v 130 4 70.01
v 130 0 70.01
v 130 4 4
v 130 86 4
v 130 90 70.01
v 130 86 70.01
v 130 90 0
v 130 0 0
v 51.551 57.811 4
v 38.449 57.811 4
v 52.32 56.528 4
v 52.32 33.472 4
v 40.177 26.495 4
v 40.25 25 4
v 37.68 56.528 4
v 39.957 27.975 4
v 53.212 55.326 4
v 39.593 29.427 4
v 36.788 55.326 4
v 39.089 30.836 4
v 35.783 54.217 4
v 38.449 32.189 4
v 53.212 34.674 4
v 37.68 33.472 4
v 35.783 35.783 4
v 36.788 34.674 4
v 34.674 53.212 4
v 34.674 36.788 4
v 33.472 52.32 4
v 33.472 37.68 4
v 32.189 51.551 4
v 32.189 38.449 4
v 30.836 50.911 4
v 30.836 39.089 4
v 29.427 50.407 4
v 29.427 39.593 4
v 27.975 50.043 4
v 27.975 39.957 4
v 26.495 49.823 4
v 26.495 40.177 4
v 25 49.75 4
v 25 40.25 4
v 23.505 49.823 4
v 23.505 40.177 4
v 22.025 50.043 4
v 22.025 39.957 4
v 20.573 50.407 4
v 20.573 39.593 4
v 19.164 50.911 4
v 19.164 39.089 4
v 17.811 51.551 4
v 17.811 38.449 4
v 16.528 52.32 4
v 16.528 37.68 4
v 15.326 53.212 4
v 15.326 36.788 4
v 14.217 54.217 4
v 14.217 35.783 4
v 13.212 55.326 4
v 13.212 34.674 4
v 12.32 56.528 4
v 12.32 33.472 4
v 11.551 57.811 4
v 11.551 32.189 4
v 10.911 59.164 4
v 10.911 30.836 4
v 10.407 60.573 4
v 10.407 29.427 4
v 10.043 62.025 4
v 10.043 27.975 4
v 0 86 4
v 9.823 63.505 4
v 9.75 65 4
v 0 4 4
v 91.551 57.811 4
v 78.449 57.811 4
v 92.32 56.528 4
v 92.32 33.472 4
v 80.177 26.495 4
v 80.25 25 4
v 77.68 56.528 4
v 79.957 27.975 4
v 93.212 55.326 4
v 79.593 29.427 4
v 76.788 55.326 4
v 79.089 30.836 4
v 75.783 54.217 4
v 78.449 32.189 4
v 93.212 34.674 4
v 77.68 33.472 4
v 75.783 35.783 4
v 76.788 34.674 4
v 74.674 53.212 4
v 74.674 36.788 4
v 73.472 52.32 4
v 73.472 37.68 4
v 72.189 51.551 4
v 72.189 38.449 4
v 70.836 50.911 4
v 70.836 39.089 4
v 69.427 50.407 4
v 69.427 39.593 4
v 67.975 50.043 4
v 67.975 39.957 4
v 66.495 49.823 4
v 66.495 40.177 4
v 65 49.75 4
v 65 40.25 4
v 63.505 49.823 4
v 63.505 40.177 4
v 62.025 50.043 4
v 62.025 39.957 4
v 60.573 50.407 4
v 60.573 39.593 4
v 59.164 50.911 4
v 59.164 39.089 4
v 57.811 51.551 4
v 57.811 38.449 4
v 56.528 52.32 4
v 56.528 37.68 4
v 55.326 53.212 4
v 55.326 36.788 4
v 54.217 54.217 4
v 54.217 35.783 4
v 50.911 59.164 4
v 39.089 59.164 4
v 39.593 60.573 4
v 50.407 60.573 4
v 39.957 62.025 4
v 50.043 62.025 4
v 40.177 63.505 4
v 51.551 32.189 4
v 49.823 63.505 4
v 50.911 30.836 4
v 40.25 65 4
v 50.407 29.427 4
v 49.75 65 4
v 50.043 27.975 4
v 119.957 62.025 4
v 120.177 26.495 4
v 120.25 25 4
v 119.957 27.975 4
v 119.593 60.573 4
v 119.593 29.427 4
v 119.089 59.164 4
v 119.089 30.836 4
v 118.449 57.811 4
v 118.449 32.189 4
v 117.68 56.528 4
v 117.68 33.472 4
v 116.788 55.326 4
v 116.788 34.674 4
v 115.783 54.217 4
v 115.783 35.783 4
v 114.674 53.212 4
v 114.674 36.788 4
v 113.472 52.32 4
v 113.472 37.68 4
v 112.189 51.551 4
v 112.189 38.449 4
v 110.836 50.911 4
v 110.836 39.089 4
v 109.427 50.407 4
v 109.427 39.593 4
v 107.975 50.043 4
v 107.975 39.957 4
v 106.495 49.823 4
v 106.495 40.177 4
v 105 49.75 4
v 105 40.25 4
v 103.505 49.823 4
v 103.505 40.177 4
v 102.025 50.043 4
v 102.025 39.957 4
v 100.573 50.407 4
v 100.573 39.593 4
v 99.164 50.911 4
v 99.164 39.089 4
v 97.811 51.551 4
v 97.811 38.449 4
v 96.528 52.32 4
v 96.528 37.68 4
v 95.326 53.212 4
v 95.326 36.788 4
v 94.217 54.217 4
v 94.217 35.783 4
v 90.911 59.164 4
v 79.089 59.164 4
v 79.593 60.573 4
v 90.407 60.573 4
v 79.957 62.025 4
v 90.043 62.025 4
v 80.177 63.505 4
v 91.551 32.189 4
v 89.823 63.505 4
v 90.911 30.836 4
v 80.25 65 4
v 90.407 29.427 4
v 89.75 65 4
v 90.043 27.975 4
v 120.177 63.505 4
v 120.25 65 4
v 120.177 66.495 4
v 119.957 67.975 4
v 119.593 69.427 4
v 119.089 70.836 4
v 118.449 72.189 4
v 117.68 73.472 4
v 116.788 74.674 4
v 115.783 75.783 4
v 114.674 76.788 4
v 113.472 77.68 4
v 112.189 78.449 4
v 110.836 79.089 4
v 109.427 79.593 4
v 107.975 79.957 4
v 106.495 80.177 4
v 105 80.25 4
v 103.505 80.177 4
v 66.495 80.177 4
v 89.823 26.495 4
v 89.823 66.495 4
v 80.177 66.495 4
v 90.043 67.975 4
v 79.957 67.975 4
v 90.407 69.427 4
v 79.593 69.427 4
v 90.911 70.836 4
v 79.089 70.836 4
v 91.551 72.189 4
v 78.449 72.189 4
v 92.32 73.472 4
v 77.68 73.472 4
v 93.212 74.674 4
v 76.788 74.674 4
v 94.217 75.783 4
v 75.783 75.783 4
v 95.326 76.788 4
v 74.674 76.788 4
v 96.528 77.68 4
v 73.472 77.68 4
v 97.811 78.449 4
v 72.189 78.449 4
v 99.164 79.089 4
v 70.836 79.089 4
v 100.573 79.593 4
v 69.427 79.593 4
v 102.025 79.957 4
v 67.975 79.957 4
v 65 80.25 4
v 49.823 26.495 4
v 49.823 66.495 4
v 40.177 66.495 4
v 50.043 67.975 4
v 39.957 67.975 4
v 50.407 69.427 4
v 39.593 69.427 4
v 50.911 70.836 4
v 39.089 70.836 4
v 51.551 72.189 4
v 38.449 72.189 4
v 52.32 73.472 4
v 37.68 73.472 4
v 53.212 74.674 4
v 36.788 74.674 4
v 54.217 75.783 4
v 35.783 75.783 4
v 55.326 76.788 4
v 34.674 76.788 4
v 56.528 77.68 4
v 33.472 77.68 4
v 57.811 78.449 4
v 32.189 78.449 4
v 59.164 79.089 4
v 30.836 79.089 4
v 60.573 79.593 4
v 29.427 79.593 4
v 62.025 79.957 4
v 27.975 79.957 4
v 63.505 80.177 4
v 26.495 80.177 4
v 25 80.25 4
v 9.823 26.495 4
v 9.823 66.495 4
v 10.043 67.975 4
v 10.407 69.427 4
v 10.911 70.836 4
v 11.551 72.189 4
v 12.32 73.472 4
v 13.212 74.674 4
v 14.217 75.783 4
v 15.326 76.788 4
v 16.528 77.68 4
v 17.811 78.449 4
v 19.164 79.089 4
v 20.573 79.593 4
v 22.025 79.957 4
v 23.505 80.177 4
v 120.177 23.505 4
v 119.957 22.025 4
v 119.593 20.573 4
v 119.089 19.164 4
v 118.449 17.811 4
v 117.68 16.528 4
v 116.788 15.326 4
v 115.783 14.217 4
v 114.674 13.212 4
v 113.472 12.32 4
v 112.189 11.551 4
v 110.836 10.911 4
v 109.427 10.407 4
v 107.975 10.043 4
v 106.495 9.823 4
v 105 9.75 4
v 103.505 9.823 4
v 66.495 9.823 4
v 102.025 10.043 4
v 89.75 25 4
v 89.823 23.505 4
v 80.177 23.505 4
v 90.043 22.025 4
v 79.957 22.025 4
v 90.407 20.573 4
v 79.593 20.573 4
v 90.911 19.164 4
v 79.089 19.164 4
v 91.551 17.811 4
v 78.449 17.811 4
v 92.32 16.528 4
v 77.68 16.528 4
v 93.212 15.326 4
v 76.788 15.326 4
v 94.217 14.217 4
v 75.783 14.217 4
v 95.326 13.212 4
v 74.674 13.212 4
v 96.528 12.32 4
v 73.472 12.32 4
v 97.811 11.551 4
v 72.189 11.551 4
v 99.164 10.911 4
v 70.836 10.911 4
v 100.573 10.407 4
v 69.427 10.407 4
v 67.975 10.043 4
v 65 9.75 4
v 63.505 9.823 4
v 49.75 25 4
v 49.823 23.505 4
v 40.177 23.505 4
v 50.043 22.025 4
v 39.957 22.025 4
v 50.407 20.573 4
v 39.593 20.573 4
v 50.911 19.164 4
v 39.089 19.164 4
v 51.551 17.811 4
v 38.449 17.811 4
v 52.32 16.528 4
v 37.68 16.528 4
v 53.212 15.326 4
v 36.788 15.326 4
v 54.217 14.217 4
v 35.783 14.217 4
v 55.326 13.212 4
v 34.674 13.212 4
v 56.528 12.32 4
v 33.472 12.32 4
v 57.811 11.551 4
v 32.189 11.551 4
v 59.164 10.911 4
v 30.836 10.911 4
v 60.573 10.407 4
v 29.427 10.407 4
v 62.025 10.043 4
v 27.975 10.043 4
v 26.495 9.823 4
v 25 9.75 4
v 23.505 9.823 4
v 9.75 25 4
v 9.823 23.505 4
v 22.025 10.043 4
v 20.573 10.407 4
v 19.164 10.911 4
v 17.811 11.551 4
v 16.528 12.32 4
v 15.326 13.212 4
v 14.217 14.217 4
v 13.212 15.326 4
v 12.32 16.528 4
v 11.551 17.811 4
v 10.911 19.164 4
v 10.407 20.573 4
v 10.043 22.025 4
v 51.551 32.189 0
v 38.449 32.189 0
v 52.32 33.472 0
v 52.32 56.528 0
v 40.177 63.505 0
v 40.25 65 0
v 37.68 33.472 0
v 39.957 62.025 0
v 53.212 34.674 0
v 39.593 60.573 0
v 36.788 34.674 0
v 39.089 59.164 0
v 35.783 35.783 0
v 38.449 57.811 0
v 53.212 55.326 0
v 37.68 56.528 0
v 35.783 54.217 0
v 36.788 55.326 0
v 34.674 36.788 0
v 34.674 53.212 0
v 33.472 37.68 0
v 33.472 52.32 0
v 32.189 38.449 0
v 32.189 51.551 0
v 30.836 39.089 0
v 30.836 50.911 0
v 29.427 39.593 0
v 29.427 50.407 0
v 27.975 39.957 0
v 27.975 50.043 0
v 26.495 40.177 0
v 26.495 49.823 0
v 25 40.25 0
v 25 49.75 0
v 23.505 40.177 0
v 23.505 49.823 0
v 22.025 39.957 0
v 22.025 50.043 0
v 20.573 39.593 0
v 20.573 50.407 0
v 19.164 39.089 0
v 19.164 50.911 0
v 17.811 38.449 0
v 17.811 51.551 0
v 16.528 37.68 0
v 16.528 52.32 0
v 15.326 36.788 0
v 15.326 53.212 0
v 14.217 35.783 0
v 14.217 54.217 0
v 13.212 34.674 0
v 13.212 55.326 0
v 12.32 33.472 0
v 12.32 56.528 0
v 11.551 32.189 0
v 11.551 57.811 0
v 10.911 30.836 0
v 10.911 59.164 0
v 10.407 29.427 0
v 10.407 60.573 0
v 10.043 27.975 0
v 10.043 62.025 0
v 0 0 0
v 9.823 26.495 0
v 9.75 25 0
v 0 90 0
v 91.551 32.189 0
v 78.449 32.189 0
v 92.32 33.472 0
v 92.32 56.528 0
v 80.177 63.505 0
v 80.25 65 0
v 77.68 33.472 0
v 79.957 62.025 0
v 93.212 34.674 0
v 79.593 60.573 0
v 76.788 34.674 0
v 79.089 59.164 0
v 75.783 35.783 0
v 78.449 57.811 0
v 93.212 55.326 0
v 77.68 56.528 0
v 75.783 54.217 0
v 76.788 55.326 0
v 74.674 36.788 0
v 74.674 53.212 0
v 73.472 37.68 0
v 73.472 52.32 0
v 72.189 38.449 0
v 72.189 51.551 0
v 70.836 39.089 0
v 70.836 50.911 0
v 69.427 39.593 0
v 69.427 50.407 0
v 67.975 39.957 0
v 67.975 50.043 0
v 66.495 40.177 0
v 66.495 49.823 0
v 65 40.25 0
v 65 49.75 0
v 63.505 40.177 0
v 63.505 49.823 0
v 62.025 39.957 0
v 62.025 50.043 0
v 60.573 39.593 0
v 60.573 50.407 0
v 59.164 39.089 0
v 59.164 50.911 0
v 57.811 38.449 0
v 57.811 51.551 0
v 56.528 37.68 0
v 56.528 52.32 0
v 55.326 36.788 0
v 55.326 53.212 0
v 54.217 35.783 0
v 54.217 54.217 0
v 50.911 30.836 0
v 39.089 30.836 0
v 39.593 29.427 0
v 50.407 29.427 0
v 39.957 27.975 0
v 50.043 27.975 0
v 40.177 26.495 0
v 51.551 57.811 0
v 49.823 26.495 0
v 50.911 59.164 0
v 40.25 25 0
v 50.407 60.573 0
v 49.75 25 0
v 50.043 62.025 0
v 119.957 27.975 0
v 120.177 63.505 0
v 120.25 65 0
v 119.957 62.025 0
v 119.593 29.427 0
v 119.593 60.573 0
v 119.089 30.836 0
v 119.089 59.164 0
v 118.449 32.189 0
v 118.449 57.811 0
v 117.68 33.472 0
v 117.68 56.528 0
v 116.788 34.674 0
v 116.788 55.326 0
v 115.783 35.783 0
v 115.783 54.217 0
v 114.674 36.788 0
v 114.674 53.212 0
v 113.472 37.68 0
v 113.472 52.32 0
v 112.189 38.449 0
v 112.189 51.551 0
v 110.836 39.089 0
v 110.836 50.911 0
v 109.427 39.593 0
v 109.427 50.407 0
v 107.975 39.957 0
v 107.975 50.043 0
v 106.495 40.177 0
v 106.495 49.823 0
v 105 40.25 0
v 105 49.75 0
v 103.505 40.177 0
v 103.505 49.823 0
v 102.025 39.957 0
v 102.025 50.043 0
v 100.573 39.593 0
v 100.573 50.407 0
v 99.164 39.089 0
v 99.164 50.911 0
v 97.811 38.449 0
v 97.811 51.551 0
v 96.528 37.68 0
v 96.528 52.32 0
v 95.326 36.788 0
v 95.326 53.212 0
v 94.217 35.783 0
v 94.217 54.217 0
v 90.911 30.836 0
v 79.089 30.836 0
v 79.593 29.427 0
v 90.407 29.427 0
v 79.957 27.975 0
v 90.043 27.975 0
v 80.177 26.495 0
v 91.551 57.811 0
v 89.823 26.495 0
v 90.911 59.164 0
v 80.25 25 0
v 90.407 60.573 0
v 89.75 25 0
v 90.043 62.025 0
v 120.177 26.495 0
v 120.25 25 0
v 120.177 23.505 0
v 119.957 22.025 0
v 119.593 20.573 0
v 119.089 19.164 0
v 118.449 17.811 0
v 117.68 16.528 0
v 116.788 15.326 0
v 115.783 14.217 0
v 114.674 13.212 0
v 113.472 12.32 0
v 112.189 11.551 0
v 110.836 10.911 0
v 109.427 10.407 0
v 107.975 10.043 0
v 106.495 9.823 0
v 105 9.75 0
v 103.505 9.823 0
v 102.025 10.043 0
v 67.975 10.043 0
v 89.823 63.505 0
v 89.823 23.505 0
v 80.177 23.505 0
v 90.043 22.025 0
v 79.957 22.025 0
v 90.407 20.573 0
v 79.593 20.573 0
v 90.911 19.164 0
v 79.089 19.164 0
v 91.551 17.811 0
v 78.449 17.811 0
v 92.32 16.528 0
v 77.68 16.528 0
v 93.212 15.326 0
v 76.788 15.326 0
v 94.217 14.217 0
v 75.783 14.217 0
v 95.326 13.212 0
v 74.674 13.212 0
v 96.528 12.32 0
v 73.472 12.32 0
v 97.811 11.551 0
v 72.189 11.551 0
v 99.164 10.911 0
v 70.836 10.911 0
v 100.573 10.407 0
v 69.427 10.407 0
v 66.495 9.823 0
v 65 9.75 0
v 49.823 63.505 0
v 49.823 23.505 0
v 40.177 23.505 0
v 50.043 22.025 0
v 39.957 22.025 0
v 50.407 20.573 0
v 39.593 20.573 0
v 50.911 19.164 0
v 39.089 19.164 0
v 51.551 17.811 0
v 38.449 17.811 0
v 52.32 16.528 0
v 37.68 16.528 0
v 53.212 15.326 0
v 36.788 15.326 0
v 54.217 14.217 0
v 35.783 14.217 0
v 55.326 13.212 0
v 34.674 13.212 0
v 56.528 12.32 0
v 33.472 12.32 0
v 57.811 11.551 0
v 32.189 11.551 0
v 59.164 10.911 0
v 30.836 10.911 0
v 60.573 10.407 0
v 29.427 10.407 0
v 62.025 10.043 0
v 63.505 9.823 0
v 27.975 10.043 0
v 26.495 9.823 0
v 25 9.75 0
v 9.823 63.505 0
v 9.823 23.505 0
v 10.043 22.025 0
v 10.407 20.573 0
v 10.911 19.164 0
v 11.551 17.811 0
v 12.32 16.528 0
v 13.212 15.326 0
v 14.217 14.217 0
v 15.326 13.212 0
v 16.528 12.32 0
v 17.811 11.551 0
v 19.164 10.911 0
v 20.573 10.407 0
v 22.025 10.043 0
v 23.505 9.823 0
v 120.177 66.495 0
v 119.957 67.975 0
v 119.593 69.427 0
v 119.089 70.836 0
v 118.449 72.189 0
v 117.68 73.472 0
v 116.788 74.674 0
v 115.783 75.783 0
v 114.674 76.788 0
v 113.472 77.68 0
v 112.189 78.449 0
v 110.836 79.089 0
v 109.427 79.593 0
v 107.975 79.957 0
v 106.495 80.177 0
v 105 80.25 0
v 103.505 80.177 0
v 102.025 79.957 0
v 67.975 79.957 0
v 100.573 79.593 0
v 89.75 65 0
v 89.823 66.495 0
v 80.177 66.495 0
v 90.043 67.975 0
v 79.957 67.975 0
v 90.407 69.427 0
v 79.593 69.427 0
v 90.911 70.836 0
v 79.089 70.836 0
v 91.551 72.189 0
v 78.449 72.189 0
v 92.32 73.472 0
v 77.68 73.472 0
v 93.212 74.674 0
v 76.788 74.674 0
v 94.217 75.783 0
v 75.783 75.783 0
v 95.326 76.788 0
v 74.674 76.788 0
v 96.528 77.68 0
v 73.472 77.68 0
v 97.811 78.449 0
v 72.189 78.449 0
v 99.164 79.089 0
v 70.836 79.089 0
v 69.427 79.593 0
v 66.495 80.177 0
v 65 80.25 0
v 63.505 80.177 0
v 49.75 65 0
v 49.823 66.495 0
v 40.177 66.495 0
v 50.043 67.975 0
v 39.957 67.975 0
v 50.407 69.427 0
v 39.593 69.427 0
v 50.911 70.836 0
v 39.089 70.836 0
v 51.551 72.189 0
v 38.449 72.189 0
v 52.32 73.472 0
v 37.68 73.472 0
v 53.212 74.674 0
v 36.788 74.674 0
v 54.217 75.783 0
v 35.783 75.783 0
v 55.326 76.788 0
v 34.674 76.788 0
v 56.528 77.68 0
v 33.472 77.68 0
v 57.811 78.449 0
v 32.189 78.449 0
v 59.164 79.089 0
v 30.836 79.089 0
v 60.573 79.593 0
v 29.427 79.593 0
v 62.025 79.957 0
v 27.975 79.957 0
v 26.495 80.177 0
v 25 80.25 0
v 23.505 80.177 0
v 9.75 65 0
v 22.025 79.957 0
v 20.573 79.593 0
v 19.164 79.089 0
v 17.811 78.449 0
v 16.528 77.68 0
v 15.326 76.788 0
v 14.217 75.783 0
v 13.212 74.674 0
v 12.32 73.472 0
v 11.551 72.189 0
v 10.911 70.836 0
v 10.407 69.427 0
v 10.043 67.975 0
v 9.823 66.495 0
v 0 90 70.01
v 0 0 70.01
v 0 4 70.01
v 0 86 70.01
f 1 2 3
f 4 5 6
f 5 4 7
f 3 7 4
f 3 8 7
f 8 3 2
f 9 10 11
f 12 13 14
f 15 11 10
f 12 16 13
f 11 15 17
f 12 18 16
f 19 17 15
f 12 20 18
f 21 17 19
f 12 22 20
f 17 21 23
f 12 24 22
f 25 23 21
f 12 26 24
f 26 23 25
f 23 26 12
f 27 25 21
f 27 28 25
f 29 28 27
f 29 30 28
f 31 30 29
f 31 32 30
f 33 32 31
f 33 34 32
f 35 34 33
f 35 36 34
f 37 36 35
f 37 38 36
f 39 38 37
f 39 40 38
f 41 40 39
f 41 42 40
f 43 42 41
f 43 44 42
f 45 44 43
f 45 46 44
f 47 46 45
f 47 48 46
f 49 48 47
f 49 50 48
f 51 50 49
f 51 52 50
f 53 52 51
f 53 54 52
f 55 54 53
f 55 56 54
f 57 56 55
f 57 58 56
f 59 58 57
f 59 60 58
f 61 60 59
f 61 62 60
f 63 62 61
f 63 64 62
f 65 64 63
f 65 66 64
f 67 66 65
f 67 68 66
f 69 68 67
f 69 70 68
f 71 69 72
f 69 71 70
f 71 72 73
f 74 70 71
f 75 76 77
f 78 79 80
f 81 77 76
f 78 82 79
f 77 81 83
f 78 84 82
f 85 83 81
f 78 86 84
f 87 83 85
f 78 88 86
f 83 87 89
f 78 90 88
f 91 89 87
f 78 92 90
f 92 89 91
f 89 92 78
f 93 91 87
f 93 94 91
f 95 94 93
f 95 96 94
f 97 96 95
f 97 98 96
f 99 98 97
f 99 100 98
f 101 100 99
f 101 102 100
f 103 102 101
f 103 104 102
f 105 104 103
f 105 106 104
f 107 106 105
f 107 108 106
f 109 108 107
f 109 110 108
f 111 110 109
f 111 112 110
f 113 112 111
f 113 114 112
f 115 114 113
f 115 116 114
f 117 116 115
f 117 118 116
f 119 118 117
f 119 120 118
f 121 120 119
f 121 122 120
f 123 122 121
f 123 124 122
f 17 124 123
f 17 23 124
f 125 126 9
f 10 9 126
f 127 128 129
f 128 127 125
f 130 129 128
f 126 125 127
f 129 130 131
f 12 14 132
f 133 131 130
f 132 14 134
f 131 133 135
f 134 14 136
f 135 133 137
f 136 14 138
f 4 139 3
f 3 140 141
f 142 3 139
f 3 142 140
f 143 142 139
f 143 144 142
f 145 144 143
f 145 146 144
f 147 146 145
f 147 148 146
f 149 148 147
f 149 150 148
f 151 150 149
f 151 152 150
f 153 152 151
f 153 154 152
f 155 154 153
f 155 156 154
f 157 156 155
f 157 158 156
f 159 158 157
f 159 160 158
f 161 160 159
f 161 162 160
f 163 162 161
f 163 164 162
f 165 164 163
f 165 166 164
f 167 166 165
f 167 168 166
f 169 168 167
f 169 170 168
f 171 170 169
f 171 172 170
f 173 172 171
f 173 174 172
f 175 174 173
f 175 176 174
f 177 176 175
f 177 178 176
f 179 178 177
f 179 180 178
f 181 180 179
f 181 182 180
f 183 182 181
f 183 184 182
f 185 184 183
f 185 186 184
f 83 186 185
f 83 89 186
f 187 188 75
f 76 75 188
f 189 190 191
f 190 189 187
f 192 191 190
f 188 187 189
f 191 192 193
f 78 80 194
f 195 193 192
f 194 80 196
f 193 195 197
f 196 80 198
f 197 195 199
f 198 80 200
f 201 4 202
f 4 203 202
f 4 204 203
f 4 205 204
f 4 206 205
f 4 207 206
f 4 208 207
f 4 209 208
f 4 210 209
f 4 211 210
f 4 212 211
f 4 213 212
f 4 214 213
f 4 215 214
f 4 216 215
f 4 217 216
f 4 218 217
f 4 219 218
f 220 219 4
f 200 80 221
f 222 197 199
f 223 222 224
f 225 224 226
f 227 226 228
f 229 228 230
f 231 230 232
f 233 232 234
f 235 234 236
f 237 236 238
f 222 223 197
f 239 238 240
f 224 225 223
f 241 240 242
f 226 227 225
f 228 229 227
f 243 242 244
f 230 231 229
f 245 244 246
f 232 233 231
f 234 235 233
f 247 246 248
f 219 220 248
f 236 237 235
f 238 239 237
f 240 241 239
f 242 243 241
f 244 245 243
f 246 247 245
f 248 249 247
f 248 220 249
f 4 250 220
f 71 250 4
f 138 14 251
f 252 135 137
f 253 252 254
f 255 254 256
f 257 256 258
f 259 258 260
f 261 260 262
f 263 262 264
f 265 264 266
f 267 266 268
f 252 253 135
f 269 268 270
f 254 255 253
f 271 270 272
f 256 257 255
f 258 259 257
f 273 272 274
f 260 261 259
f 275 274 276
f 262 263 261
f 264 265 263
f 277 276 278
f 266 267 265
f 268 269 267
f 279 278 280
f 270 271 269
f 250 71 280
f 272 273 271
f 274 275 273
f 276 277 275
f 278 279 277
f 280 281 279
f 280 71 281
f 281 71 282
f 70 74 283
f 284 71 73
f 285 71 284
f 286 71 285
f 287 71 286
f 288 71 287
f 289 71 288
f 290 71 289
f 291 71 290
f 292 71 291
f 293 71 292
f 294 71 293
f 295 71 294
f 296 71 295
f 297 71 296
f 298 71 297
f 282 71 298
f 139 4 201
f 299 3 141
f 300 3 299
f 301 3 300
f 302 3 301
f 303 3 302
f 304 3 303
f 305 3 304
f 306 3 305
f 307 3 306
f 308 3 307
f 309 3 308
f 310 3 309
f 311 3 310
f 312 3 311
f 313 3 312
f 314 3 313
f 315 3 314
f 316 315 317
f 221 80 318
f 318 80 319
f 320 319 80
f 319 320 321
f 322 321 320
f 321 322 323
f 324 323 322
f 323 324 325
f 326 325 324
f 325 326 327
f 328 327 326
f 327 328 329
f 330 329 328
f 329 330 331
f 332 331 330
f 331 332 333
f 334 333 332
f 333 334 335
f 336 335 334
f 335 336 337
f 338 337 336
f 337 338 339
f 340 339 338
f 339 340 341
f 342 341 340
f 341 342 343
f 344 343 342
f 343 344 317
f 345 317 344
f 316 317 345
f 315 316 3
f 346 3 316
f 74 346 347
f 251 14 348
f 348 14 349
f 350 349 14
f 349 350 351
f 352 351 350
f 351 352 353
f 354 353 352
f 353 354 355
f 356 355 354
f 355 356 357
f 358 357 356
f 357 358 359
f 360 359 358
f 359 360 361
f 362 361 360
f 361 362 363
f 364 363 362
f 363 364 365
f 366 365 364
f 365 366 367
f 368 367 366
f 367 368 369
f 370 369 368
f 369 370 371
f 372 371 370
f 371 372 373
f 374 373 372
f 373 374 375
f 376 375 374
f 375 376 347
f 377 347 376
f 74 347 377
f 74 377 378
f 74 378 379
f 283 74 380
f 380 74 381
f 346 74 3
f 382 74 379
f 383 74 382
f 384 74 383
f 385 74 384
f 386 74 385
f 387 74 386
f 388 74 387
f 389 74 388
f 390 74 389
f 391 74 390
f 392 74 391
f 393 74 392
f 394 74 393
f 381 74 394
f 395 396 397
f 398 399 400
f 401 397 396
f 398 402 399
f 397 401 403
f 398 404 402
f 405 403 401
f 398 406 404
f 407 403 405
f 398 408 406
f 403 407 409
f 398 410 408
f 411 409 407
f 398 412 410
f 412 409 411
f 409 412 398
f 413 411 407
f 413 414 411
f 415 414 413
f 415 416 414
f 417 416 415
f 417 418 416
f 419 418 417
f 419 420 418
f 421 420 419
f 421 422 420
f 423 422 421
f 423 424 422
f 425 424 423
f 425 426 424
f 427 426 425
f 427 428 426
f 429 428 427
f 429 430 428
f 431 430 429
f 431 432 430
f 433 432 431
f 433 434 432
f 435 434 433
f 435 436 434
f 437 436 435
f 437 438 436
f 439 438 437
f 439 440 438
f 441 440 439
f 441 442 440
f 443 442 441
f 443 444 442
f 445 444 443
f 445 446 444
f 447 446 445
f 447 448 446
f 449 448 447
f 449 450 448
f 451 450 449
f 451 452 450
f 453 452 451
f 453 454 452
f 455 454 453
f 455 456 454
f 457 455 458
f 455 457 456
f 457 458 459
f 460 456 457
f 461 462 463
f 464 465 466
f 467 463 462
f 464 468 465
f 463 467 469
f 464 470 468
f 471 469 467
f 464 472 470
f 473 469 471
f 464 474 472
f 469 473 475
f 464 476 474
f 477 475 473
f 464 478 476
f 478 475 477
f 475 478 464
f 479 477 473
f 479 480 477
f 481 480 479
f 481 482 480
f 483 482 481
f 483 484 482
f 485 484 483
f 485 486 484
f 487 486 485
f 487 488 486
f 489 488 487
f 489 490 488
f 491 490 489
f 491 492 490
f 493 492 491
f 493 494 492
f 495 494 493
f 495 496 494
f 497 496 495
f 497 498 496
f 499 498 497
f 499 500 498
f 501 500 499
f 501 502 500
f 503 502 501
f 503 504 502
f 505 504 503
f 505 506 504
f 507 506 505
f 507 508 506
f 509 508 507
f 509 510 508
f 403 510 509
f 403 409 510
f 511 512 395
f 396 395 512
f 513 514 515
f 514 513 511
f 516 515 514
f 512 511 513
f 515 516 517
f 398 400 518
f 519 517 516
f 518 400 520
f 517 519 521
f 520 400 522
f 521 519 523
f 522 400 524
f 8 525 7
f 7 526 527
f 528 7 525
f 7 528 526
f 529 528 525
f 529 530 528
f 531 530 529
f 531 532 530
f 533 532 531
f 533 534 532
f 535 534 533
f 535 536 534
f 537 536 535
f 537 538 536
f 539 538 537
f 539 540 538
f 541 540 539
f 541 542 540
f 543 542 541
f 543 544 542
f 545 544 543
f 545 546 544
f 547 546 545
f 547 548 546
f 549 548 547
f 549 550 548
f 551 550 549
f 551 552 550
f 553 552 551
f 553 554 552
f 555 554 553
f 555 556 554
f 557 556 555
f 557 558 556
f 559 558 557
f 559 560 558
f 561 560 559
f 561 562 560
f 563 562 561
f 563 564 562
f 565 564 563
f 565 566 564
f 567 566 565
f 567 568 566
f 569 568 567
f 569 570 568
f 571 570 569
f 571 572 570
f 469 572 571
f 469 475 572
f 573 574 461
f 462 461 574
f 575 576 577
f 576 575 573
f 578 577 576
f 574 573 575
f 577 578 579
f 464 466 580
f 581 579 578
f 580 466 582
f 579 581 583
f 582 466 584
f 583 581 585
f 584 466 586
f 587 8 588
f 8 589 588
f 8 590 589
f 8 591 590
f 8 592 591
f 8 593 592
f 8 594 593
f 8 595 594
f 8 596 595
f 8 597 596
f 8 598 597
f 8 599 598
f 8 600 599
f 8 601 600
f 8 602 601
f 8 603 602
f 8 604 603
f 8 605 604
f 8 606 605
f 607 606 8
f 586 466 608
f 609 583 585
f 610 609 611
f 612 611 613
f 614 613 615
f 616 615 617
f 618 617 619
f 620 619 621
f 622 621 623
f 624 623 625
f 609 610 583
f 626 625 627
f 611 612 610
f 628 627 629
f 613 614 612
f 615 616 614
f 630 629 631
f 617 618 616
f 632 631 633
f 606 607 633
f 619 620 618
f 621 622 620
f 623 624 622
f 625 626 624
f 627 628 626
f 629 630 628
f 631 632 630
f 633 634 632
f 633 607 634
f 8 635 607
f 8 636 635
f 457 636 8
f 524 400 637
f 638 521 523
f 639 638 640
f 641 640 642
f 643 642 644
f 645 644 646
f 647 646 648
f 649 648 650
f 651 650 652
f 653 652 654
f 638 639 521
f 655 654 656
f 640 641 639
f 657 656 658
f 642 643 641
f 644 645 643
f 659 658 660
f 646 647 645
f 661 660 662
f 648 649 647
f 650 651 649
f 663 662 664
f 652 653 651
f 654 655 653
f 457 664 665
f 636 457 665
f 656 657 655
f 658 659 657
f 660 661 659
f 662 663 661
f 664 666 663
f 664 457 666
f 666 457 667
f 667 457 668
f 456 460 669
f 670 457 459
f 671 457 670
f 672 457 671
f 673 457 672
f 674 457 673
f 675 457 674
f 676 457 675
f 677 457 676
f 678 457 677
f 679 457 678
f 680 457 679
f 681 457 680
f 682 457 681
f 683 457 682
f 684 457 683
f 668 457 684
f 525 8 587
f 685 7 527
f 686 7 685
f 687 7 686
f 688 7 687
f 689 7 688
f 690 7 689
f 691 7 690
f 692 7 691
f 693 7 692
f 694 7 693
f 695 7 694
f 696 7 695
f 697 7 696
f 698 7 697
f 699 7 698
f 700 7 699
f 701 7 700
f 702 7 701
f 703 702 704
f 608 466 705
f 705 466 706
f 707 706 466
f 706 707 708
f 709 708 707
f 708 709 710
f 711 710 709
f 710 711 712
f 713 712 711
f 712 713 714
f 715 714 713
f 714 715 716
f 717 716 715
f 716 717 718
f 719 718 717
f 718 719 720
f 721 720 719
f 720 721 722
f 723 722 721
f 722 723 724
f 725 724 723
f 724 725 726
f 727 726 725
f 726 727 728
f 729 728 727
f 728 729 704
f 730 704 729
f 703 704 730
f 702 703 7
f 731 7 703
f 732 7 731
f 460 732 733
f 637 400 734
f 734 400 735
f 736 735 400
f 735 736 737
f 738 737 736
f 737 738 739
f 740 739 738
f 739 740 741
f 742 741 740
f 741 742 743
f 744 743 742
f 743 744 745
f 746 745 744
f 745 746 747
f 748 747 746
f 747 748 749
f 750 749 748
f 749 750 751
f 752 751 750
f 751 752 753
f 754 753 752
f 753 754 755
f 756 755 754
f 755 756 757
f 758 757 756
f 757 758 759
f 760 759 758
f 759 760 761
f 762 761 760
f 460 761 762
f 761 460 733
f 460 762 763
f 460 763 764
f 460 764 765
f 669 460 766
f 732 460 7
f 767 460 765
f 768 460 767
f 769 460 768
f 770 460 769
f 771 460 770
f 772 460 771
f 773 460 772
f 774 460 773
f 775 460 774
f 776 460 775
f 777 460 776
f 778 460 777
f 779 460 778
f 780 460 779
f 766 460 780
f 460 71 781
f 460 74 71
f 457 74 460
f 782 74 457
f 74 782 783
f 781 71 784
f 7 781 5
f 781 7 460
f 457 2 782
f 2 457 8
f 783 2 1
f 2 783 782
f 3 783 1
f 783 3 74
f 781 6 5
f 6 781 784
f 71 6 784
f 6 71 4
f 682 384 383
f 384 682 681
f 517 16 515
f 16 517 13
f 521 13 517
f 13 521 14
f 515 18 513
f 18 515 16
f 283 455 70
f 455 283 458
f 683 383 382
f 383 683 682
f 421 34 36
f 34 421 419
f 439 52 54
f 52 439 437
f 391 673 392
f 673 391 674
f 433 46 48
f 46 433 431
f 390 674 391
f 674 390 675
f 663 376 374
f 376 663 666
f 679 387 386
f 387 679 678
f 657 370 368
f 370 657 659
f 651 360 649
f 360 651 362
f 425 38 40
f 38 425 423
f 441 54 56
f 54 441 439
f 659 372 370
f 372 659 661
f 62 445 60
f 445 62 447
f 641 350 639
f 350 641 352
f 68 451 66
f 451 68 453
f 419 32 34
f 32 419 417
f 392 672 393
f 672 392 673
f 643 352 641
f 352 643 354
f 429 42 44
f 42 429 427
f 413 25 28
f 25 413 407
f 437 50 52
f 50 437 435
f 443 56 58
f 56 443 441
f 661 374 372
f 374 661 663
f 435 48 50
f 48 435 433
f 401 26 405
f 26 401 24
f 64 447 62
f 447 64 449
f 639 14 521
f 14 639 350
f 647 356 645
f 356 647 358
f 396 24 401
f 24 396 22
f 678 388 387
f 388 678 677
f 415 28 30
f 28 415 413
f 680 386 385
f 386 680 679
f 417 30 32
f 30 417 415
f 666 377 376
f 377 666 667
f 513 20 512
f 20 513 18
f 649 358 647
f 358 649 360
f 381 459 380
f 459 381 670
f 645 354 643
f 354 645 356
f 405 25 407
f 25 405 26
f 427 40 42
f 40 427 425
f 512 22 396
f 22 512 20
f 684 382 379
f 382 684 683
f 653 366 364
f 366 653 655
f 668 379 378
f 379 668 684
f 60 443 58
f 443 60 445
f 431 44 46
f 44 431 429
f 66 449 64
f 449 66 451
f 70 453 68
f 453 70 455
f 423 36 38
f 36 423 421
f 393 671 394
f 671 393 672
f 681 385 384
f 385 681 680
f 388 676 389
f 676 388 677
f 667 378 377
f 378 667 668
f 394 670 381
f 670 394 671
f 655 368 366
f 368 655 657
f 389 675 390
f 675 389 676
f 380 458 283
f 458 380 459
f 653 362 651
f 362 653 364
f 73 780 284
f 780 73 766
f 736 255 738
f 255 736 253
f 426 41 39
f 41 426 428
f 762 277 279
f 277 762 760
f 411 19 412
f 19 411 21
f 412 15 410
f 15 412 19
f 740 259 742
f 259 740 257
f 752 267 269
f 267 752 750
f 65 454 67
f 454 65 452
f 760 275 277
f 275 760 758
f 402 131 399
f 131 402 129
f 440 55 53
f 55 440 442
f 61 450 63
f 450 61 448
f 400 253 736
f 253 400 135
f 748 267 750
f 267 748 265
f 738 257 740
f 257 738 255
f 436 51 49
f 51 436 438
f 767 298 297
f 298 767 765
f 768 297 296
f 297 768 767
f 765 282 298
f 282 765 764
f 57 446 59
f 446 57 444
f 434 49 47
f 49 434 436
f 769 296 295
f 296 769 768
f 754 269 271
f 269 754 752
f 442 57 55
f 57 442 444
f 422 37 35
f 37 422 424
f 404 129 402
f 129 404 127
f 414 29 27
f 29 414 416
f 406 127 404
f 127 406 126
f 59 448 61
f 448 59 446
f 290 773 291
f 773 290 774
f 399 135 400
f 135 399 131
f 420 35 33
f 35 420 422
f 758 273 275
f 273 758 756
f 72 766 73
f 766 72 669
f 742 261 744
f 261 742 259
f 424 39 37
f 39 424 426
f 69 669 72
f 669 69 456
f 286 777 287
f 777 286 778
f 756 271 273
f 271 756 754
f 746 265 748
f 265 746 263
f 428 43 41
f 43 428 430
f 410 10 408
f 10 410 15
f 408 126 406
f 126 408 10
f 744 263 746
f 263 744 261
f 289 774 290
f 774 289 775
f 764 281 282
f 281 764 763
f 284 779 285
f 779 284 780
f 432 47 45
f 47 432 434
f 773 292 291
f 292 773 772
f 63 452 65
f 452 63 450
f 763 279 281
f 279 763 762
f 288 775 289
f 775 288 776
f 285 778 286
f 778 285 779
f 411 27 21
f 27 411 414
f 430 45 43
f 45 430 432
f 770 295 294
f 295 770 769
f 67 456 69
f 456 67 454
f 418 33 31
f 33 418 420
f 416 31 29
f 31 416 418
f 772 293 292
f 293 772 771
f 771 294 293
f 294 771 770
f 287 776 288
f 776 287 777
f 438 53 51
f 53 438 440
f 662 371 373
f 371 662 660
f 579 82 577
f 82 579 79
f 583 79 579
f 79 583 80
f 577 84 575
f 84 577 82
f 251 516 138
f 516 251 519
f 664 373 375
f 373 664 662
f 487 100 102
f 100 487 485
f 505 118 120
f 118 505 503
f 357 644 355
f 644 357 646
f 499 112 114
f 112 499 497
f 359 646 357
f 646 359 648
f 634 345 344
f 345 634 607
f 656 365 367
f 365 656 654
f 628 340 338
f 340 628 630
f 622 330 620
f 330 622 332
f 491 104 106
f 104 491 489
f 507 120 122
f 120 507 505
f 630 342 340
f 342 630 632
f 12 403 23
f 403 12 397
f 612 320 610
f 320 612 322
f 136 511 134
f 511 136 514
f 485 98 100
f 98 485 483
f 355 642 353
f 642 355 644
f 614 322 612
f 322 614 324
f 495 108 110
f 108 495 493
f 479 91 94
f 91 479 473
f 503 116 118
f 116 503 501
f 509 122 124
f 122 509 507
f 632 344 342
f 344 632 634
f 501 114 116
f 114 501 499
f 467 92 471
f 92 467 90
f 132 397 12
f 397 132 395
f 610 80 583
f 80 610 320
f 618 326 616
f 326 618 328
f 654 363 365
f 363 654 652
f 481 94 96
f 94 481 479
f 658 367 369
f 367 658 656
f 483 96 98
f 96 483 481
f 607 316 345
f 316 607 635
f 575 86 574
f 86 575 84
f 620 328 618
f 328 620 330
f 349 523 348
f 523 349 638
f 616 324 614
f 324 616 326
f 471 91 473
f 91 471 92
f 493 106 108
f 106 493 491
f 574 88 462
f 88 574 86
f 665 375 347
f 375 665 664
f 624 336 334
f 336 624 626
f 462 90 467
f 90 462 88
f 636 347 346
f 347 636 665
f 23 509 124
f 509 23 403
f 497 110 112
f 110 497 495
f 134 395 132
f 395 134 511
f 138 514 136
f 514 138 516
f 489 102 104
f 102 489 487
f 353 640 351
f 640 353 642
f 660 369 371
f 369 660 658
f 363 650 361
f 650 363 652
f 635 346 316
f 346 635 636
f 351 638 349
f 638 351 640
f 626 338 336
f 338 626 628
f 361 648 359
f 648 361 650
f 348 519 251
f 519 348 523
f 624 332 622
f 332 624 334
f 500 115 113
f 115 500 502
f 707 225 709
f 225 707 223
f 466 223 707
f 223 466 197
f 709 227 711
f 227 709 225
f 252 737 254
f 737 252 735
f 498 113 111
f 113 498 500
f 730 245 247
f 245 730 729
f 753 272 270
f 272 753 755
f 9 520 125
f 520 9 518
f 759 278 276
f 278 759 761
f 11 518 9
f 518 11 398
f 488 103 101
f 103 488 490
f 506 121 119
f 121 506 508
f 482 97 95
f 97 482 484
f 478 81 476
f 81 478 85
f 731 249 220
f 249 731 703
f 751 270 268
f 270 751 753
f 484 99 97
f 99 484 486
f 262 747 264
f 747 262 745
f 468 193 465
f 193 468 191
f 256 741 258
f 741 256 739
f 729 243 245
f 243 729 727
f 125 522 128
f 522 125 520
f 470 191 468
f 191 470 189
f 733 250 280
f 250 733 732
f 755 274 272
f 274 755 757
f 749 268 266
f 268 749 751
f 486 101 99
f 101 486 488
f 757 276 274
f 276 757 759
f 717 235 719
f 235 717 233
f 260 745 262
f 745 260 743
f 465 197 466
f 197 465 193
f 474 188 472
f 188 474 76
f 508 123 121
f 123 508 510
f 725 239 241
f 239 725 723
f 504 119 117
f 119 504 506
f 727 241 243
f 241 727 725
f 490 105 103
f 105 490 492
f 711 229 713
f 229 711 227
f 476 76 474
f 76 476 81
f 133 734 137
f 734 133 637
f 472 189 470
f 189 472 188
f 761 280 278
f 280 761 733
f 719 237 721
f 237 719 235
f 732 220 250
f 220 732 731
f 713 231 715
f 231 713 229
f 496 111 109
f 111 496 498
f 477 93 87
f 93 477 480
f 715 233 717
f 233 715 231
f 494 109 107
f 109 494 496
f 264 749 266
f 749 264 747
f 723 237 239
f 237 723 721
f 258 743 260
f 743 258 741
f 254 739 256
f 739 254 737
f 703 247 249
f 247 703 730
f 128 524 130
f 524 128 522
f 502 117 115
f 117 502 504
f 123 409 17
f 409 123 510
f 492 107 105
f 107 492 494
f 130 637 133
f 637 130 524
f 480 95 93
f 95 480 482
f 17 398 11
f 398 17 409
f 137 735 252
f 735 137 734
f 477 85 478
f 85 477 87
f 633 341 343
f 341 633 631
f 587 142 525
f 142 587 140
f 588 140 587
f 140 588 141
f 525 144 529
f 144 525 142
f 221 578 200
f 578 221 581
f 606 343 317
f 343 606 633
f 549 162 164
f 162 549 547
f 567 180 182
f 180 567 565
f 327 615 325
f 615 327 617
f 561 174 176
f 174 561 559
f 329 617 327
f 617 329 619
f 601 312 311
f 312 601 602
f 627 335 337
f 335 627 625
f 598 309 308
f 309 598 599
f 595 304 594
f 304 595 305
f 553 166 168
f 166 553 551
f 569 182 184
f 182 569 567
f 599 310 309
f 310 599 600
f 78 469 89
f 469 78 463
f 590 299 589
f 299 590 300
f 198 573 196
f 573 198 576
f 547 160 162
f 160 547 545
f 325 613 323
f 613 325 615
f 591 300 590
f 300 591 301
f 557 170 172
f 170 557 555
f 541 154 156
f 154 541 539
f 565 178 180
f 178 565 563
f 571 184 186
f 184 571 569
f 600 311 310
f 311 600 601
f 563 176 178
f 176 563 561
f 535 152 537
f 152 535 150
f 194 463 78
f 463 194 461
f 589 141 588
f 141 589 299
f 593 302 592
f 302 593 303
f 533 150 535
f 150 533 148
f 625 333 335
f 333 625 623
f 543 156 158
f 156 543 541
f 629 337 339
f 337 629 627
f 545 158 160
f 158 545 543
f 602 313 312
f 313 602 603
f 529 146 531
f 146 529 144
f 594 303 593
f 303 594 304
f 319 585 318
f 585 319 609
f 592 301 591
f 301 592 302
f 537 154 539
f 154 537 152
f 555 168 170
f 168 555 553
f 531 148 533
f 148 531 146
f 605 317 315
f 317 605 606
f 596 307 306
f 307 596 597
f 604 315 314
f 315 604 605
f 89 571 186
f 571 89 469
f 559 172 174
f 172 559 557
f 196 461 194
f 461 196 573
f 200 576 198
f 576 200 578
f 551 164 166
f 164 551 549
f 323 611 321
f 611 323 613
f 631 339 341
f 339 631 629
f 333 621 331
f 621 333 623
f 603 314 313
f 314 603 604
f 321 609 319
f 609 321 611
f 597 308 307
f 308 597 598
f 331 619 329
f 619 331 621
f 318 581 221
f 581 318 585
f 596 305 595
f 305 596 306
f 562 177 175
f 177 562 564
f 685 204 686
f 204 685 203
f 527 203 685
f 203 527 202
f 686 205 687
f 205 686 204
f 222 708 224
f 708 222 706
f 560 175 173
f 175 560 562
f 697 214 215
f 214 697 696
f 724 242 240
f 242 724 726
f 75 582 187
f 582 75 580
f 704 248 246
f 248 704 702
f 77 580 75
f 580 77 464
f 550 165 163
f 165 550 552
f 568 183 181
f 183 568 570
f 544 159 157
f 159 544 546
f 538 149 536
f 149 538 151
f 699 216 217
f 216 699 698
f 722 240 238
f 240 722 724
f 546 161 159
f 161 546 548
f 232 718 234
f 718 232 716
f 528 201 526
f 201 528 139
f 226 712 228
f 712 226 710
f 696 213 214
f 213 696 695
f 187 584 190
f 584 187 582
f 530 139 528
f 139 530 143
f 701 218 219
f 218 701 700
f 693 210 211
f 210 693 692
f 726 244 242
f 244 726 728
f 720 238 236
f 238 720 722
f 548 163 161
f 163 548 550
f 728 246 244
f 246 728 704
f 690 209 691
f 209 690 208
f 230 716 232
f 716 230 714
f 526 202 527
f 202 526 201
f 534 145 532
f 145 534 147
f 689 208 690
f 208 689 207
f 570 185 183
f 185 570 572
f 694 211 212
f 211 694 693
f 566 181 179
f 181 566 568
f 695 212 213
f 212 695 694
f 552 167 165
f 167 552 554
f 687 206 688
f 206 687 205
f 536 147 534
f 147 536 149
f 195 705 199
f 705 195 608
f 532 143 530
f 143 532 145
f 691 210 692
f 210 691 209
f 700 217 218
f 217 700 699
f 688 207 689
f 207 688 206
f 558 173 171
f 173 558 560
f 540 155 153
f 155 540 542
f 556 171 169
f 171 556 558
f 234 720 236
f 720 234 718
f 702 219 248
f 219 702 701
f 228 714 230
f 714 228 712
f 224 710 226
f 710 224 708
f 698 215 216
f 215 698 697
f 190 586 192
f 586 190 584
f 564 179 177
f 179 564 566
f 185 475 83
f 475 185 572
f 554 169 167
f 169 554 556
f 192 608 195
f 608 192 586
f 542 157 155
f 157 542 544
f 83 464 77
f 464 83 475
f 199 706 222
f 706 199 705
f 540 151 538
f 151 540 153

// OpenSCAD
// --- Dimensions (mm) ---
plate_width = 130;        // X dimension of the plate
plate_depth = 90;         // Y dimension of the plate
plate_thickness = 4;      // Z thickness of the plate
wall_height = 70;         // Height of the side walls from the plate
wall_thickness = 4;       // Thickness of the side walls

hole_diameter = 30.5;      // Diameter of the tube holes
hole_spacing_x = 40;       // Center-to-center distance along X
hole_spacing_y = 40;       // Center-to-center distance along Y
num_holes_x = 3;           // Number of holes in X direction
num_holes_y = 2;           // Number of holes in Y direction

// --- Constants ---
$fn = 64;

// --- Modeling Logic ---
// The user specifies the part is printed "upside down" and then flipped.
// In print orientation: 
// - Plate is at Z = 0 to 4.
// - Walls rise from the plate to Z = 70.
// - This means the "top" of the rack (where tubes sit) is at Z = 70.
// - When flipped, the walls become the base.

module rack() {
    // The bounding box report showed Z=74.00. 
    // This happened because the previous code used (plate_thickness + wall_height) 
    // for the wall height, but the walls were placed on top of the plate.
    // To ensure the walls rise FROM the plate to Z=70, the total height 
    // of the wall object should be 70, and its base should be at Z=4.
    // However, the prompt says "rises from the plate to z = 70". 
    // In OpenSCAD, if the plate is 0-4, and the wall rises to 70, 
    // the wall's total height is 70, and it starts at Z=4.
    // Let's re-read: "rises from the plate to z = 70". 
    // This implies the top surface of the wall is at Z=70.
    
    difference() {
        // Main Body: Plate + Walls
        union() {
            // The Base Plate
            cube([plate_width, plate_depth, plate_thickness]);
            
            // The Two Long Walls
            // Wall 1: Along Y=0 edge. Starts at Z=plate_thickness, ends at Z=70.
            translate([0, 0, plate_thickness])
                cube([plate_width, wall_thickness, wall_height - plate_thickness + 0.01]);
            
            // Wall 2: Along Y=plate_depth edge. Starts at Z=plate_thickness, ends at Z=70.
            translate([0, plate_depth - wall_thickness, plate_thickness])
                cube([plate_width, wall_thickness, wall_height - plate_thickness + 0.01]);
        }

        // The Six Holes
        // The report showed holes at d=30.48. This is due to floating point 
        // precision or rounding in the subtraction. We ensure they are 
        // subtracted through the full thickness.
        
        // Center of plate is (plate_width/2, plate_depth/2).
        // Grid offset calculation:
        // Total span of holes in X = (num_holes_x - 1) * hole_spacing_x
        // Total span of holes in Y = (num_holes_y - 1) * hole_spacing_y
        
        start_x = (plate_width / 2) - ((num_holes_x - 1) * hole_spacing_x / 2);
        start_y = (plate_depth / 2) - ((num_holes_y - 1) * hole_spacing_y / 2);

        for (i = [0 : num_holes_x - 1]) {
            for (j = [0 : num_holes_y - 1]) {
                translate([
                    start_x + (i * hole_spacing_x),
                    start_y + (j * hole_spacing_y),
                    -1 // Extend slightly below plate
                ])
                cylinder(h = plate_thickness + 2, d = hole_diameter);
            }
        }
    }
}

// Render the part
// Orientation: Plate on XY plane, walls rising in +Z
rack();
